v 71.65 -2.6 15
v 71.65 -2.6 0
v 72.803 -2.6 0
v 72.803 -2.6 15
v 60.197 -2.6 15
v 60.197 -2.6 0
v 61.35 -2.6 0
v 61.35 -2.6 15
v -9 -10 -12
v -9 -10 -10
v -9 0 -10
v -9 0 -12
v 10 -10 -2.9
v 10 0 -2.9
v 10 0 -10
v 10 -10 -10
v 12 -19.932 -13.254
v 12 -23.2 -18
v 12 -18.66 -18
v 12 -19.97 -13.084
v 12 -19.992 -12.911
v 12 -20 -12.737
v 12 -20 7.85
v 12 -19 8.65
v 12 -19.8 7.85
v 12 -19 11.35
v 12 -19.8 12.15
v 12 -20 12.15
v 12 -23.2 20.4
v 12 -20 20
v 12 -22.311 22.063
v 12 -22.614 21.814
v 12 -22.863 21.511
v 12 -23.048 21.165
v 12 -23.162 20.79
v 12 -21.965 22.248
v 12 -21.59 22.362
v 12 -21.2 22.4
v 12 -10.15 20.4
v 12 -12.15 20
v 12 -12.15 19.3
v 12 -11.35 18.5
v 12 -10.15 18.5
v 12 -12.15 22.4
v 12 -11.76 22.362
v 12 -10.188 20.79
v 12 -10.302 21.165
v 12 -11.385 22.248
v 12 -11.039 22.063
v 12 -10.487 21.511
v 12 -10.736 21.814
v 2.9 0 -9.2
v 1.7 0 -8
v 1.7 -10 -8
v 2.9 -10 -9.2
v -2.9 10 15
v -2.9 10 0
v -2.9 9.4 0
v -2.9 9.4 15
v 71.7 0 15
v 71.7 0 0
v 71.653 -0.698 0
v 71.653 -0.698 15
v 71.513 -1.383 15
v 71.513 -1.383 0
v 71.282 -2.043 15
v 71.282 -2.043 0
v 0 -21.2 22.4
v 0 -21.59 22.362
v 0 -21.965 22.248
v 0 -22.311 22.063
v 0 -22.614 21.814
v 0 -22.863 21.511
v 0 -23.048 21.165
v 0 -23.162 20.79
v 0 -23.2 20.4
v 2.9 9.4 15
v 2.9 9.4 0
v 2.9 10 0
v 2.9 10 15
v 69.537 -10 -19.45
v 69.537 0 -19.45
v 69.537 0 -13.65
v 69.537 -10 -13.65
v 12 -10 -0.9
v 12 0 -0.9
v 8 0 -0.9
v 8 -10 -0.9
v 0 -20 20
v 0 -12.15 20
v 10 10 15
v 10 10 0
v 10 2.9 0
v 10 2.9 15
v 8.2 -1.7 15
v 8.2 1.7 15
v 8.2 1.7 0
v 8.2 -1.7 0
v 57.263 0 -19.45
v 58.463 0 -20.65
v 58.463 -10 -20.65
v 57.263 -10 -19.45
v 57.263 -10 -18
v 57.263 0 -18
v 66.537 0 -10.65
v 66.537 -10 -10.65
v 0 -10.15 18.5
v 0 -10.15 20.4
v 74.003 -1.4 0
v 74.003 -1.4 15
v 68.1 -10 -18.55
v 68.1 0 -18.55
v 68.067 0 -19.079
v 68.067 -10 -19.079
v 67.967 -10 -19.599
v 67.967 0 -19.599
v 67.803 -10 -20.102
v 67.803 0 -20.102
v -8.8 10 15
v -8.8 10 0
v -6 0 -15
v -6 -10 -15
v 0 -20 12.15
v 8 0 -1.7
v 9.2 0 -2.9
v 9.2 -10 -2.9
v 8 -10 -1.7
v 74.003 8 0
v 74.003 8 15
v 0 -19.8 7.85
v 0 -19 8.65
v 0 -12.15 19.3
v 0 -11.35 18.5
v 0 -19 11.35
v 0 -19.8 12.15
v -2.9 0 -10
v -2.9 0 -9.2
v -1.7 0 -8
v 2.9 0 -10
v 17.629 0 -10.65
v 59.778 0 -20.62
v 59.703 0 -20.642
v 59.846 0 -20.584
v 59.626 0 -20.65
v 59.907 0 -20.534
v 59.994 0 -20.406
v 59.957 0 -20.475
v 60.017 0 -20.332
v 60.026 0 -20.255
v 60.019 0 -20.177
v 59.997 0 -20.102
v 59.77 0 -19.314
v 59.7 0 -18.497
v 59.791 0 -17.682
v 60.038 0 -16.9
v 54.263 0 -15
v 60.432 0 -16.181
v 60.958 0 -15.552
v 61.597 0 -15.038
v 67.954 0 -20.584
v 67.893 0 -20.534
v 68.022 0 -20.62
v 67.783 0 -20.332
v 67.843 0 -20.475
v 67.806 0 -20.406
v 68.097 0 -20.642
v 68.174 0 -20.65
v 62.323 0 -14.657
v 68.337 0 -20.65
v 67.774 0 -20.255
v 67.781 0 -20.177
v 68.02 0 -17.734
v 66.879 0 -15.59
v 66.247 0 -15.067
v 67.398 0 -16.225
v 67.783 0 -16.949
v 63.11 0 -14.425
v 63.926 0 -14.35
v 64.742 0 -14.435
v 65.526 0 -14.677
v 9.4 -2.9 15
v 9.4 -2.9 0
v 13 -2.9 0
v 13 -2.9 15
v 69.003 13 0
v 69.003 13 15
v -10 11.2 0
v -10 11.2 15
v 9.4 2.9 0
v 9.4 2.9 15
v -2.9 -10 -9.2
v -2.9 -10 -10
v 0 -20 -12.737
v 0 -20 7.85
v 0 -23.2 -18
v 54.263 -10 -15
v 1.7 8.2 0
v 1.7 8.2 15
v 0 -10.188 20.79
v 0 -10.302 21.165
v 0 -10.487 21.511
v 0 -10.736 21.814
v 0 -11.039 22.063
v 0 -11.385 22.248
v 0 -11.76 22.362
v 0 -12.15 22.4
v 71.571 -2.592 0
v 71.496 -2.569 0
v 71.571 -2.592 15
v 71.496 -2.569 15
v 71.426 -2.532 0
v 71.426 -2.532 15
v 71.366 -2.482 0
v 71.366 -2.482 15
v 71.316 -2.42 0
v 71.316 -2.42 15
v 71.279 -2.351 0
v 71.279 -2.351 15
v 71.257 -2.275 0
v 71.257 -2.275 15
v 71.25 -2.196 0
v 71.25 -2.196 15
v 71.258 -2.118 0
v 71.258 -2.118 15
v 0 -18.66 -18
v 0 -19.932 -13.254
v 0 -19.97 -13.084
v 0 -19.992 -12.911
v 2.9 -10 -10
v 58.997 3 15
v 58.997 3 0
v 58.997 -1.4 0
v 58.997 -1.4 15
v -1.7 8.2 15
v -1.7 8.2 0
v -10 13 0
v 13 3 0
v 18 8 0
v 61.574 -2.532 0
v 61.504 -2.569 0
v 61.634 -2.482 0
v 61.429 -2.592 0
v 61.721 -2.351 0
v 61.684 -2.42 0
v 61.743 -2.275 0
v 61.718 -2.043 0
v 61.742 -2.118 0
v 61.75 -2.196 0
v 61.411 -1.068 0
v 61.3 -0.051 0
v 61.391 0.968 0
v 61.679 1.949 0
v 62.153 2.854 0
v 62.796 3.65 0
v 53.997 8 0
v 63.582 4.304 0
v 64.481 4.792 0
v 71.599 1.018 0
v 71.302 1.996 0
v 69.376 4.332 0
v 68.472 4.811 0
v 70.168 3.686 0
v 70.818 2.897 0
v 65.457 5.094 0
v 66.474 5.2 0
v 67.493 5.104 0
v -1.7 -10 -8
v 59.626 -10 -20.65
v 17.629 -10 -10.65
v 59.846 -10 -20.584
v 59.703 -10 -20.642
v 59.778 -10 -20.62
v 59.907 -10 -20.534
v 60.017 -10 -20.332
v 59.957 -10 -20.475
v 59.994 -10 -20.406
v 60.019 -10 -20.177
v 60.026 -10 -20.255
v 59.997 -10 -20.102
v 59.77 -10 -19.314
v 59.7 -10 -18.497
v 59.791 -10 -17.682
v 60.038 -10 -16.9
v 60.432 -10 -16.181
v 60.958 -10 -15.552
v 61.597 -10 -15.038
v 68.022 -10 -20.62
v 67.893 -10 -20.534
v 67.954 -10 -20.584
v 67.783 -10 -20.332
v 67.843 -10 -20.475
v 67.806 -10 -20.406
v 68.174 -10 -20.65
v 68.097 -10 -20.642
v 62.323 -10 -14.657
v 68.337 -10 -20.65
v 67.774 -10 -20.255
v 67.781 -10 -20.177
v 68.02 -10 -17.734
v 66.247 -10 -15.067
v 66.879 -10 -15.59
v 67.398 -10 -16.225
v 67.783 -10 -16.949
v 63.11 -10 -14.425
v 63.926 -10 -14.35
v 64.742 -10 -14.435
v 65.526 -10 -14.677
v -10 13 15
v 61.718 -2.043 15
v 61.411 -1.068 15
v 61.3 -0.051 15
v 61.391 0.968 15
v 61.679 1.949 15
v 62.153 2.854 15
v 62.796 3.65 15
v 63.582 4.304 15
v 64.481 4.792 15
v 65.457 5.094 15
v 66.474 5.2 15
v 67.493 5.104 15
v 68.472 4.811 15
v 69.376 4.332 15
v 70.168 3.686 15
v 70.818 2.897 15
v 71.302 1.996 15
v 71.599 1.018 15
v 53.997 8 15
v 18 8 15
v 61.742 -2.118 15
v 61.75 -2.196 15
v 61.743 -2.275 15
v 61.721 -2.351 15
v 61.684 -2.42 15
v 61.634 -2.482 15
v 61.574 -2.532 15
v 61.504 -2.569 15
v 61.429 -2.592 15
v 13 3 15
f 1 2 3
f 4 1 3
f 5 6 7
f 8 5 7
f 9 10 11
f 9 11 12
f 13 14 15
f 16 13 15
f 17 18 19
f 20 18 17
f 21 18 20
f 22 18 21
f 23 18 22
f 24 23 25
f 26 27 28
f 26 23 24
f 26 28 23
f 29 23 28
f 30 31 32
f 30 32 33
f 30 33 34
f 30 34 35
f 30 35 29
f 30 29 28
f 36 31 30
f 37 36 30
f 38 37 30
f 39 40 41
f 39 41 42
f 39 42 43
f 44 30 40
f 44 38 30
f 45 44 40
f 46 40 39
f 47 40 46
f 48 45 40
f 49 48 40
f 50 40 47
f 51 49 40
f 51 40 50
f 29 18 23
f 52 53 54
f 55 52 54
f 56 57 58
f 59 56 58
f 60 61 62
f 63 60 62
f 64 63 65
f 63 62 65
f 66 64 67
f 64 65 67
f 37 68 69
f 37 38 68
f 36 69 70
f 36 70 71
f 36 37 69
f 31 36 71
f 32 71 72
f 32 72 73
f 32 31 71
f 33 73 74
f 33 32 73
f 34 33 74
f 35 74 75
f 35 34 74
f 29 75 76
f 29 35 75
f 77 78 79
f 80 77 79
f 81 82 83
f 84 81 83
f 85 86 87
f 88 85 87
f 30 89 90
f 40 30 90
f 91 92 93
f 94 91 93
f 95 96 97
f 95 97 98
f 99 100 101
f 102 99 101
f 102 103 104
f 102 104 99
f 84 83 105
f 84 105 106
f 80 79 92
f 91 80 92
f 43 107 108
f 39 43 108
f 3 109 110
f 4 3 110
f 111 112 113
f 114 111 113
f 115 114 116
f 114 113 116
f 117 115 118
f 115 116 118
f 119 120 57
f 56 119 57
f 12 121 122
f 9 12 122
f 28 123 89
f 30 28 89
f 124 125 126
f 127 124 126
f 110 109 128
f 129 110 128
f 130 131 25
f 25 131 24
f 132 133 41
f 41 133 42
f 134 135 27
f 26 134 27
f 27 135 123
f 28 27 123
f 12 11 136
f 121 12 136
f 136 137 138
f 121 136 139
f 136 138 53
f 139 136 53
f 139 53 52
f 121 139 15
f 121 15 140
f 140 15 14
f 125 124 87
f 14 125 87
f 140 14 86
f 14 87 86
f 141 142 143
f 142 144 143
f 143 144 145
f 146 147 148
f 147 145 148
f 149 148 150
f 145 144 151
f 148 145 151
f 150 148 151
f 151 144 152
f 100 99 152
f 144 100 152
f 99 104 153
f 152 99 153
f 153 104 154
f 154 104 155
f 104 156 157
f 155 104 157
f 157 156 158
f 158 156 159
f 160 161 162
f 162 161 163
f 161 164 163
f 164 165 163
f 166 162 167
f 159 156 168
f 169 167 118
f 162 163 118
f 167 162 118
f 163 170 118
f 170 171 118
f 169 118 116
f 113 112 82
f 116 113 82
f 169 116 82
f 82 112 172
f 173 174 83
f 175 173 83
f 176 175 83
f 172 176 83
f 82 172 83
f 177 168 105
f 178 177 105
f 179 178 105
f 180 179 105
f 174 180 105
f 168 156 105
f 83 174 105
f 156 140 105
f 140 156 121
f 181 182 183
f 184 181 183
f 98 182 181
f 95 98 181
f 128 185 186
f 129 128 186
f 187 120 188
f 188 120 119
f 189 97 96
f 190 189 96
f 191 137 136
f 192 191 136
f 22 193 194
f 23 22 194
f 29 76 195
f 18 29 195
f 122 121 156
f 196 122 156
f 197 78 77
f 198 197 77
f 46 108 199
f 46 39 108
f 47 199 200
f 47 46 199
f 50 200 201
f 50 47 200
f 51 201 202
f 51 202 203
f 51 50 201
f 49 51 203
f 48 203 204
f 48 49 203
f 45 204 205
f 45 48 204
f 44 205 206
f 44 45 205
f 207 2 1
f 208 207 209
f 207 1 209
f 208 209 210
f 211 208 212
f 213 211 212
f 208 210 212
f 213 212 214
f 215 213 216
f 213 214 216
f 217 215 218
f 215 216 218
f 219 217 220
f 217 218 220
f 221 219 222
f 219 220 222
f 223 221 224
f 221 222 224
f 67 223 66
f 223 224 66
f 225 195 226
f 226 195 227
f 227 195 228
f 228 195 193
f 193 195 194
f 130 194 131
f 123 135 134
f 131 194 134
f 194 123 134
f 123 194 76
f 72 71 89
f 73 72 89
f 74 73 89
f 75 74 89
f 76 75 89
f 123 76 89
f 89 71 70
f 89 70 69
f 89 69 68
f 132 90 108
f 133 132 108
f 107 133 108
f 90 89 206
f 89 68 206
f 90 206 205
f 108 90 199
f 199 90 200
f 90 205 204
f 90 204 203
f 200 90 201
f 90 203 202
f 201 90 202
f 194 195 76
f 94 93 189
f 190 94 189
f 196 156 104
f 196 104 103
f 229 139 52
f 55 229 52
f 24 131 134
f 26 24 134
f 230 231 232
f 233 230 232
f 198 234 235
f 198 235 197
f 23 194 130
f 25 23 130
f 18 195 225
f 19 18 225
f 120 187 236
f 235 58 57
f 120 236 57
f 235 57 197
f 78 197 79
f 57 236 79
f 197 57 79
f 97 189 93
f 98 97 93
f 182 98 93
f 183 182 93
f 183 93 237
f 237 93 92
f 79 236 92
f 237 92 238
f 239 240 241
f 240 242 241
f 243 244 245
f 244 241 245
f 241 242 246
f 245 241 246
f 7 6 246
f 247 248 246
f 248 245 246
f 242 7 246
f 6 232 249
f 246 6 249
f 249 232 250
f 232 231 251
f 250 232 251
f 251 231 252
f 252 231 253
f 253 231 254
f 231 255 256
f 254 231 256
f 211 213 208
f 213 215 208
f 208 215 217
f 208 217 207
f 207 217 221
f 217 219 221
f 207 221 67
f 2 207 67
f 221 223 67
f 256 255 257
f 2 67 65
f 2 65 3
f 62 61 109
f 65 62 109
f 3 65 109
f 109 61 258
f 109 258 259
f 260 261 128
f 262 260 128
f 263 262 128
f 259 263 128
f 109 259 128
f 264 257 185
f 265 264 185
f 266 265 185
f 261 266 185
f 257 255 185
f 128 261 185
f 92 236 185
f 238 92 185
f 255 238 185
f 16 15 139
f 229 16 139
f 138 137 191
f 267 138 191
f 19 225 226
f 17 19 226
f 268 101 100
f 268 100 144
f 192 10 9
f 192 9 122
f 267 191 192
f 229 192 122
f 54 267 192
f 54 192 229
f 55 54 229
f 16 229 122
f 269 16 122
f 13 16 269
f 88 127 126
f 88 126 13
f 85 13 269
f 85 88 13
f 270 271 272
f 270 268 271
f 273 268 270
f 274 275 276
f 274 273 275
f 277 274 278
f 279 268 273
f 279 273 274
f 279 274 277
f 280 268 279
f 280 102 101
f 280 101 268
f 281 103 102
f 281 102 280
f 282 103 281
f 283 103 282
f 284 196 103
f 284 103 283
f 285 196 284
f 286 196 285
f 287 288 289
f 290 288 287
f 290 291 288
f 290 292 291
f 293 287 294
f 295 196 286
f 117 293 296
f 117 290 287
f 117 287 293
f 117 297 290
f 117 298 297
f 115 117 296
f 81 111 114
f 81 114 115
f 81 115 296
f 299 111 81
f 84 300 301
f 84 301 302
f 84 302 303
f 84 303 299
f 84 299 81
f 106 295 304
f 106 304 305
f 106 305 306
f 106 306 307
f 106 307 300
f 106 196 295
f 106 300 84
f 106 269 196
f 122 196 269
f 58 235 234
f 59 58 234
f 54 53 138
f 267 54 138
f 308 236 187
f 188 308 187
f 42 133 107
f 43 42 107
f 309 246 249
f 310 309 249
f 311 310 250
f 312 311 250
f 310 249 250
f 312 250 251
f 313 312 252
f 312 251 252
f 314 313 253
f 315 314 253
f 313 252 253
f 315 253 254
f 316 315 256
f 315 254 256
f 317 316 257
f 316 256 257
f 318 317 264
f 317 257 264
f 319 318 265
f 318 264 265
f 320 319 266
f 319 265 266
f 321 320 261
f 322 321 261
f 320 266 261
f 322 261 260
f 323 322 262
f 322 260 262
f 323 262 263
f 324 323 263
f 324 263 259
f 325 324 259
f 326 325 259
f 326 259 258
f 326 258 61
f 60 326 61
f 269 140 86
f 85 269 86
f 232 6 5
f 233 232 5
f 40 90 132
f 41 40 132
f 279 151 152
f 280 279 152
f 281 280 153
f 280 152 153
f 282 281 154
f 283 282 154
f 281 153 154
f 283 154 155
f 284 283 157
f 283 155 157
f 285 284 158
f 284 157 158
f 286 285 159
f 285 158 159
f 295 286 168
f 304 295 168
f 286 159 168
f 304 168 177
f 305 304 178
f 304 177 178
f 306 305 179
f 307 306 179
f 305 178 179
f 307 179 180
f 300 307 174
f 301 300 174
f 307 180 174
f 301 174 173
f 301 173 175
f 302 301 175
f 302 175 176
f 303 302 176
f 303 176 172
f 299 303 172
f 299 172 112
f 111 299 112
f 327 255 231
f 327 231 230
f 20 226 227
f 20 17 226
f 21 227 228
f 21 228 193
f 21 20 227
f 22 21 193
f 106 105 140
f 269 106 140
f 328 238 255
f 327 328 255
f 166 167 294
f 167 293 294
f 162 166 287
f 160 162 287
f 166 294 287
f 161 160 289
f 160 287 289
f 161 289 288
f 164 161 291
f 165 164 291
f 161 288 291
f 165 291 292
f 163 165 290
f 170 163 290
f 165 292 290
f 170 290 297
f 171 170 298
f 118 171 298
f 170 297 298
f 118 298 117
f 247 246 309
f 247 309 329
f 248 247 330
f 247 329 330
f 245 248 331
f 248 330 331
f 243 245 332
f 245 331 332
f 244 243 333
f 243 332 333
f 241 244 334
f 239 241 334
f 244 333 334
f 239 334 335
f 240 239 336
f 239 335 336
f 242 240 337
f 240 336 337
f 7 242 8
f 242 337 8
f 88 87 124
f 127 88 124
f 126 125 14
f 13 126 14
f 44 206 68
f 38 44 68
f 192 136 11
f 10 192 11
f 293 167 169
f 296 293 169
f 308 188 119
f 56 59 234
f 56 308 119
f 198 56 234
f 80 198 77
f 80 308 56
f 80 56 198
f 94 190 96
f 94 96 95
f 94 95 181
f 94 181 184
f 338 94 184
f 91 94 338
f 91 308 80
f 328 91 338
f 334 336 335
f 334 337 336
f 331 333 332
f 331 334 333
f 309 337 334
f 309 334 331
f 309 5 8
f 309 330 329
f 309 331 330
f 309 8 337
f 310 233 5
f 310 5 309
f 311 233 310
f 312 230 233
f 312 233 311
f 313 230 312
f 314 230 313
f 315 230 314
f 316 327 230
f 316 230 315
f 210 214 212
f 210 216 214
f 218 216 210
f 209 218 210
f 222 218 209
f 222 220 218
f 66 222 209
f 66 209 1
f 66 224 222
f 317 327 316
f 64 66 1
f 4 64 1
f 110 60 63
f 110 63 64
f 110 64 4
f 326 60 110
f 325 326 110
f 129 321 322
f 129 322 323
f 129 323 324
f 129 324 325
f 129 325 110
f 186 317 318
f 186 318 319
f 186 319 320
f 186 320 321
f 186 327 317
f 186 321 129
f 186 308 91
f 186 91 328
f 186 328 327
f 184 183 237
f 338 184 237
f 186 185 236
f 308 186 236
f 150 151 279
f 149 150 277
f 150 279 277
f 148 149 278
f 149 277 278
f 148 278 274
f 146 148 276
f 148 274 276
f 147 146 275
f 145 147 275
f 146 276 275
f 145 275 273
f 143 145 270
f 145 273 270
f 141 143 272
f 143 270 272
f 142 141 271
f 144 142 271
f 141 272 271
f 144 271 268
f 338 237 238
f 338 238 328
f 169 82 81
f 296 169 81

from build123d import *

# Parameters (mm, degrees)
F2_DEPTH  = 10
F3_SIZE   = 1.2
F4_SIZE   = 3
F6_DEPTH  = 15
F7_SIZE   = 1.2
F8_SIZE   = 5
F9_R      = 0.4
F9_2_R    = 0.4
F11_DEPTH = 12
F12_SIZE  = 0.8
F13_R     = 2


with BuildPart() as f2:
    # F1 (on Front) → F2 (new body)
    with BuildSketch(Plane.XZ):
        with BuildLine():
            Line((8, -0.9), (8, -2.9))
            Line((8, -2.9), (10, -2.9))
            Line((10, -2.9), (10, -10))
            Line((10, -10), (2.9, -10))
            Line((2.9, -10), (2.9, -8))
            Line((2.9, -8), (-2.9, -8))
            Line((-2.9, -8), (-2.9, -10))
            Line((-2.9, -10), (-9, -10))
            Line((-9, -10), (-9, -15))
            Line((-9, -15), (57.262693, -15))
            Line((57.262693, -15), (57.262693, -20.65))
            Line((57.262693, -20.65), (60.262693, -20.65))
            ThreePointArc((60.262693, -20.65), (62.81296, -14.493112), (68.1, -18.55))
            ThreePointArc((68.1, -18.55), (67.956888, -19.63704), (67.537307, -20.65))
            Line((67.537307, -20.65), (69.537307, -20.65))
            Line((69.537307, -20.65), (69.537307, -10.65))
            Line((69.537307, -10.65), (17.629165, -10.65))
            Line((17.629165, -10.65), (12, -0.9))
            Line((12, -0.9), (8, -0.9))
        make_face()
    extrude(amount=F2_DEPTH)

    # F3
    f3_edges = [f2.edges().sort_by_distance(p)[0] for p in [
        (-2.9, -5, -8),
        (2.9, -5, -8),
        (8, -5, -2.9),
        (57.262693, -5, -20.65),
        (69.537307, -5, -20.65),
    ]]
    chamfer(f3_edges, length=F3_SIZE)

    # F4
    f4_edges = [f2.edges().sort_by_distance(p)[0] for p in [
        (-9, -5, -15),
        (57.262693, -5, -15),
        (69.537307, -5, -10.65),
    ]]
    chamfer(f4_edges, length=F4_SIZE)

    # F9
    f9_edges = [f2.edges().sort_by_distance(p)[0] for p in [
        (60.262693, -5, -20.65),
        (67.537307, -5, -20.65),
    ]]
    fillet(f9_edges, radius=F9_R)


with BuildPart() as f6:
    # F5 (on Top) → F6 (new body)
    with BuildSketch(Plane.XY):
        with BuildLine():
            ThreePointArc((61.996668, -2.6), (65.154141, 5.022814), (71.7, 0))
            ThreePointArc((71.7, 0), (71.522814, -1.345859), (71.003332, -2.6))
            Line((71.003332, -2.6), (74.003332, -2.6))
            Line((74.003332, -2.6), (74.003332, 13))
            Line((74.003332, 13), (-10, 13))
            Line((-10, 13), (-10, 10))
            Line((-10, 10), (-2.9, 10))
            Line((-2.9, 10), (-2.9, 8.2))
            Line((-2.9, 8.2), (2.9, 8.2))
            Line((2.9, 8.2), (2.9, 10))
            Line((2.9, 10), (10, 10))
            Line((10, 10), (10, 2.9))
            Line((10, 2.9), (8.2, 2.9))
            Line((8.2, 2.9), (8.2, -2.9))
            Line((8.2, -2.9), (10, -2.9))
            Line((10, -2.9), (13, -2.9))
            Line((13, -2.9), (13, 8))
            Line((13, 8), (58.996668, 8))
            Line((58.996668, 8), (58.996668, -2.6))
            Line((58.996668, -2.6), (61.996668, -2.6))
        make_face()
    extrude(amount=F6_DEPTH)

    # F7
    f7_edges = [f6.edges().sort_by_distance(p)[0] for p in [
        (8.2, 2.9, 7.5),
        (8.2, -2.9, 7.5),
        (-2.9, 8.2, 7.5),
        (2.9, 8.2, 7.5),
        (-10, 10, 7.5),
        (58.996668, -2.6, 7.5),
        (74.003332, -2.6, 7.5),
    ]]
    chamfer(f7_edges, length=F7_SIZE)

    # F8
    f8_edges = [f6.edges().sort_by_distance(p)[0] for p in [
        (74.003332, 13, 7.5),
        (58.996668, 8, 7.5),
        (13, 8, 7.5),
    ]]
    chamfer(f8_edges, length=F8_SIZE)

    # F9#2
    f9_2_edges = [f6.edges().sort_by_distance(p)[0] for p in [
        (61.996668, -2.6, 7.5),
        (71.003332, -2.6, 7.5),
    ]]
    fillet(f9_2_edges, radius=F9_2_R)


with BuildPart() as f11:
    # F10 (on Right) → F11 (new body)
    with BuildSketch(Plane.YZ):
        Polygon((-12.15, 20), (-12.15, 18.5), (-10.15, 18.5), (-10.15, 22.4), (-23.2, 22.4), (-23.2, -18), (-18.660254, -18), (-20, -13), (-20, 7.85), (-19, 7.85), (-19, 12.15), (-20, 12.15), (-20, 20), align=None)
    extrude(amount=F11_DEPTH)

    # F12
    f12_edges = [f11.edges().sort_by_distance(p)[0] for p in [
        (6, -19, 12.15),
        (6, -12.15, 18.5),
        (6, -19, 7.85),
    ]]
    chamfer(f12_edges, length=F12_SIZE)

    # F13
    f13_edges = [f11.edges().sort_by_distance(p)[0] for p in [
        (6, -23.2, 22.4),
        (6, -20, -13),
        (6, -10.15, 22.4),
    ]]
    fillet(f13_edges, radius=F13_R)


solid = Compound([f2.part, f6.part, f11.part])
